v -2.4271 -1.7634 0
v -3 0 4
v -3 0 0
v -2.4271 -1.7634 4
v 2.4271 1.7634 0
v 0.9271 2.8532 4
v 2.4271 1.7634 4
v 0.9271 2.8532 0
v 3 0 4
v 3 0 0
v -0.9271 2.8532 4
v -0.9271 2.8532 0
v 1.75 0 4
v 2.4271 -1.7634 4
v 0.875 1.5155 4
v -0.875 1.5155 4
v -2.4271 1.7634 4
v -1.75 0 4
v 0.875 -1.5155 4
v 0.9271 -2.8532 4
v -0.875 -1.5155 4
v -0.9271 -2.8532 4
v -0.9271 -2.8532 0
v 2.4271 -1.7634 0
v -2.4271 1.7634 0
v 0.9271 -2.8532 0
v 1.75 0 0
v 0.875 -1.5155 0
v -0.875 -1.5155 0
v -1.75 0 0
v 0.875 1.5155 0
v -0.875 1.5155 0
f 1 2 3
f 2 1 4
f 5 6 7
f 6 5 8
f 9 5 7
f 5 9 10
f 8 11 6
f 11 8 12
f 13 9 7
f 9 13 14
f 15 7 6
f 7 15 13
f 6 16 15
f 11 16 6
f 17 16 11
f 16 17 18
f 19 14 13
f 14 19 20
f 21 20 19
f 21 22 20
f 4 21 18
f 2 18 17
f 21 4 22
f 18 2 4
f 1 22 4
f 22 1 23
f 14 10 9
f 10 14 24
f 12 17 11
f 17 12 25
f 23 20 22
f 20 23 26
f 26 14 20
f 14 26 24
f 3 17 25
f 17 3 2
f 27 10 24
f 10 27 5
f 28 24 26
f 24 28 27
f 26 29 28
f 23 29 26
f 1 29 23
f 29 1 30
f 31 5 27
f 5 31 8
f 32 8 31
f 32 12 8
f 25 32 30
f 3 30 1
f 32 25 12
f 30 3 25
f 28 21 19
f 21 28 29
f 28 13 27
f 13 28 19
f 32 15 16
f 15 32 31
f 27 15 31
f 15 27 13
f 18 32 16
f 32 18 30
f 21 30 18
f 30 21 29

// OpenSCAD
standoff_default_height = 4;
standoff_outer_radius = 3;
standoff_inner_radius = 1.75;	// hole on board is 1.6mm, 1.75 gives room for the bolts
standoff_extra_hole_depth = 5;

standoff();

module standoff(standoff_height = standoff_default_height) {
	difference() {
		cylinder(r=standoff_outer_radius, h=standoff_height);
		translate([0, 0, -standoff_extra_hole_depth]) cylinder(r=standoff_inner_radius, h=standoff_height + standoff_extra_hole_depth);
	}
}
